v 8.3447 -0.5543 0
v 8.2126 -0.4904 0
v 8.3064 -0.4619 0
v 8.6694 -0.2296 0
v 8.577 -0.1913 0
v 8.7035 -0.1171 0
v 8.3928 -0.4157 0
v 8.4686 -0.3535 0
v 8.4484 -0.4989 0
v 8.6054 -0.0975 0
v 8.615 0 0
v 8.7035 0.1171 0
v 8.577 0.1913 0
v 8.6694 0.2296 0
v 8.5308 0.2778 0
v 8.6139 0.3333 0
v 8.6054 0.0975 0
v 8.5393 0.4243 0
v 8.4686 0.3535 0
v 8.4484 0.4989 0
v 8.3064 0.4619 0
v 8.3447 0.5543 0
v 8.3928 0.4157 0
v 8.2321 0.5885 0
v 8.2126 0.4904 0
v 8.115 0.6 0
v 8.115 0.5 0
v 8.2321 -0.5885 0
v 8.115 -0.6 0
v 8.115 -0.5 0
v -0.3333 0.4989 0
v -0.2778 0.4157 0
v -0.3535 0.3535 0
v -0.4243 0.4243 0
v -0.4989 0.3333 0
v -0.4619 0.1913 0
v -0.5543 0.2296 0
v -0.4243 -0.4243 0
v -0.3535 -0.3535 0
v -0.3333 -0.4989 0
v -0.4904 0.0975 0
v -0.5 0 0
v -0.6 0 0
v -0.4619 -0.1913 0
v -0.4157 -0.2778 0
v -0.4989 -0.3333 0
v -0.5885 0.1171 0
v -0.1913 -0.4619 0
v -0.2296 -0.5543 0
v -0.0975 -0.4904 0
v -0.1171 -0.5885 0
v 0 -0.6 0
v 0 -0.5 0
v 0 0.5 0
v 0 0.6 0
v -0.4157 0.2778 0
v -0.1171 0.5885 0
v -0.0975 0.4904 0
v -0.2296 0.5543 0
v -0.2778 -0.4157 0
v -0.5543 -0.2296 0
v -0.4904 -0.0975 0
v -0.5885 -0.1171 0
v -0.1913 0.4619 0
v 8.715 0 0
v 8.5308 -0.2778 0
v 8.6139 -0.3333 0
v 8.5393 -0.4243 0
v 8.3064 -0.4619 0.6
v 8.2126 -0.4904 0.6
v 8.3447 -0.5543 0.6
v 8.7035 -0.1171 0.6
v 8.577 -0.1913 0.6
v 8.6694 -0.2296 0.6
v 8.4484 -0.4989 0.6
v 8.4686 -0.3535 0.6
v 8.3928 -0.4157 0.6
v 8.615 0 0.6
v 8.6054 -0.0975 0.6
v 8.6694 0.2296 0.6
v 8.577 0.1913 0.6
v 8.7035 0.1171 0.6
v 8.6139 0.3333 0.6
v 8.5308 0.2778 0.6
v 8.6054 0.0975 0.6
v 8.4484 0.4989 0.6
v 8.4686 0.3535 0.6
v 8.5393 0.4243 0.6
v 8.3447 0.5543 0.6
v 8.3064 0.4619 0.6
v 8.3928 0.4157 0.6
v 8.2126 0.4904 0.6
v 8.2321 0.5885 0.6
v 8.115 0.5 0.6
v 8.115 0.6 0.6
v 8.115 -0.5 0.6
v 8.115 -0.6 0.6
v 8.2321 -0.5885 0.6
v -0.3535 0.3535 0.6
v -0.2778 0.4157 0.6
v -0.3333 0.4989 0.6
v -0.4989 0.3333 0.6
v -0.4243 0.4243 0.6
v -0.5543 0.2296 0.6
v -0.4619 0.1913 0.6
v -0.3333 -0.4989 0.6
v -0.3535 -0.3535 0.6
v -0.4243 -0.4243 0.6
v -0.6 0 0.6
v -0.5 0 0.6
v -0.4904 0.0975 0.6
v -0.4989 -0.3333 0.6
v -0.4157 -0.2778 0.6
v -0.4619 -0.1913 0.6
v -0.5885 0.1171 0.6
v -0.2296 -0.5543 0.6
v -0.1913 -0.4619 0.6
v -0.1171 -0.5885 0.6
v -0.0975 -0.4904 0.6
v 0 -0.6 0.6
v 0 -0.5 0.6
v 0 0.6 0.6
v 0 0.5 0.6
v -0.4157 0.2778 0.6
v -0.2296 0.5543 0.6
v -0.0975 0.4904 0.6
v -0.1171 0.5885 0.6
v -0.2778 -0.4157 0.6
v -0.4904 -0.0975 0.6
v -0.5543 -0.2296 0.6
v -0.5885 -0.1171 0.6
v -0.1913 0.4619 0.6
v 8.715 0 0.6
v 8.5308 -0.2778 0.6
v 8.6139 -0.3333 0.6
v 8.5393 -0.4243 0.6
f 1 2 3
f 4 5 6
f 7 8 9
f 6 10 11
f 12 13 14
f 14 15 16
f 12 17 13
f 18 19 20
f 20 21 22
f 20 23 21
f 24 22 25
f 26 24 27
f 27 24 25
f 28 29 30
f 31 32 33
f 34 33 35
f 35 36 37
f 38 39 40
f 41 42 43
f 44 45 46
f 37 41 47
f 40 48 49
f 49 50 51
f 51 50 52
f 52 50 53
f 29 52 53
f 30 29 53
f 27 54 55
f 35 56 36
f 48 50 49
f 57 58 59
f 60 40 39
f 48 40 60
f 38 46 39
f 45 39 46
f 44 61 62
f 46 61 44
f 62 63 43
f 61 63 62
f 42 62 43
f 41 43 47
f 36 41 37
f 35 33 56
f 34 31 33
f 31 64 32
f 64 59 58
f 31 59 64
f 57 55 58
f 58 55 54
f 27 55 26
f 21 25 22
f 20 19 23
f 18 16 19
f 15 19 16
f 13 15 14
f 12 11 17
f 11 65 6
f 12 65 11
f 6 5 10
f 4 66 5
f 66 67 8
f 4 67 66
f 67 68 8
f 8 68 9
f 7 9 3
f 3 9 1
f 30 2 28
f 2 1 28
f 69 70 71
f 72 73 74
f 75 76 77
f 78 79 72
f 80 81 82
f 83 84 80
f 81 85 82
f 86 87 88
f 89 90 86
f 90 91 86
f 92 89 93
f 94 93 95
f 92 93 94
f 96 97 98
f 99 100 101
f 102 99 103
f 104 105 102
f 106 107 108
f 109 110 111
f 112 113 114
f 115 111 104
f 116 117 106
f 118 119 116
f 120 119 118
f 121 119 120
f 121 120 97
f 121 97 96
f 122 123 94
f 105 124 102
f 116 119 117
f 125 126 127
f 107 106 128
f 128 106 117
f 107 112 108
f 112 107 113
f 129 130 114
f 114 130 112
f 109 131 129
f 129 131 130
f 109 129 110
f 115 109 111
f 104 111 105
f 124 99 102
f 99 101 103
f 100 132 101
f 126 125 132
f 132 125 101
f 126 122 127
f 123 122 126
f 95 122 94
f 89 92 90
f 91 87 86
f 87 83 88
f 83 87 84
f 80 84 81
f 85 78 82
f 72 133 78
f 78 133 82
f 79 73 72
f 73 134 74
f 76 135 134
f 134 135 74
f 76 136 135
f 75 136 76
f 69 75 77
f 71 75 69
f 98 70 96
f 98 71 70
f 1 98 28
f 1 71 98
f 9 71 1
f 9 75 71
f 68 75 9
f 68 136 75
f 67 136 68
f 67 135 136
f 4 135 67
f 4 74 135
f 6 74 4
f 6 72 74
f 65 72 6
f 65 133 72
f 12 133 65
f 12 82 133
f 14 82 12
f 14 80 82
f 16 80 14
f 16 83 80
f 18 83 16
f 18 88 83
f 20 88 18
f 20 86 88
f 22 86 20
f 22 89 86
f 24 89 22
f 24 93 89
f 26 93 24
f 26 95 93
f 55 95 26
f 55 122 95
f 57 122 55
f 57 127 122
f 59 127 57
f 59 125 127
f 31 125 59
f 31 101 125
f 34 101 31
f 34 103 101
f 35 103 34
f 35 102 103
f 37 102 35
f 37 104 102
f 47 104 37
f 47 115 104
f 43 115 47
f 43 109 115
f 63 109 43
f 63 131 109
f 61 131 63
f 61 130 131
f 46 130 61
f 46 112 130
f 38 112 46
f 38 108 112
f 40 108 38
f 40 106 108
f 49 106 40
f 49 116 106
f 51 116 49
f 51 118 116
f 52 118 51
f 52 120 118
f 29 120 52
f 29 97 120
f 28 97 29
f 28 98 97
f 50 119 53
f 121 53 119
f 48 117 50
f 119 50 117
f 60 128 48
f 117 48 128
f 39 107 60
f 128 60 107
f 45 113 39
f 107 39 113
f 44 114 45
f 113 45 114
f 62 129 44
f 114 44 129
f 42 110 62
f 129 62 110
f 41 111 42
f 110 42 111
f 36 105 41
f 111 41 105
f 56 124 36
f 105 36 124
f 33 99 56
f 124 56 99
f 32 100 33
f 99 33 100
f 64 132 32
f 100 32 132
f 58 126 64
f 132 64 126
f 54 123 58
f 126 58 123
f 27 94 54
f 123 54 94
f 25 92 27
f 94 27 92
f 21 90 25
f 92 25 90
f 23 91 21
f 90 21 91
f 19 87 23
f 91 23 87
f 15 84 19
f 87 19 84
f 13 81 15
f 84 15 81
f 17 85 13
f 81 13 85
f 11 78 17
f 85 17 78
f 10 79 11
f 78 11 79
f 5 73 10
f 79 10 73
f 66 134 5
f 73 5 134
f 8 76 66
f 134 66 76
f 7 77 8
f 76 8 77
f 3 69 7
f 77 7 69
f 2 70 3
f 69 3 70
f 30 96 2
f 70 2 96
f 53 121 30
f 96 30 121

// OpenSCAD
// (pitch_len is permiter)
module BeltLoop(pitch_len =20.0, belt_width=0.6, start_loop_rad=0.6, end_loop_rad=0.6)
{
    $fn=32;
    loop_length = ( pitch_len -(PI*(start_loop_rad+end_loop_rad)) )/2;
    linear_extrude(belt_width)
    {
        difference()
        {
            hull()
            {

                circle(start_loop_rad);
                translate([loop_length, 0, 0]) circle(end_loop_rad);
            }
            hull()
            {

                circle(start_loop_rad-0.1);
                translate([loop_length, 0, 0]) circle(end_loop_rad-0.1);
            }
        }
    }
}

BeltLoop();
